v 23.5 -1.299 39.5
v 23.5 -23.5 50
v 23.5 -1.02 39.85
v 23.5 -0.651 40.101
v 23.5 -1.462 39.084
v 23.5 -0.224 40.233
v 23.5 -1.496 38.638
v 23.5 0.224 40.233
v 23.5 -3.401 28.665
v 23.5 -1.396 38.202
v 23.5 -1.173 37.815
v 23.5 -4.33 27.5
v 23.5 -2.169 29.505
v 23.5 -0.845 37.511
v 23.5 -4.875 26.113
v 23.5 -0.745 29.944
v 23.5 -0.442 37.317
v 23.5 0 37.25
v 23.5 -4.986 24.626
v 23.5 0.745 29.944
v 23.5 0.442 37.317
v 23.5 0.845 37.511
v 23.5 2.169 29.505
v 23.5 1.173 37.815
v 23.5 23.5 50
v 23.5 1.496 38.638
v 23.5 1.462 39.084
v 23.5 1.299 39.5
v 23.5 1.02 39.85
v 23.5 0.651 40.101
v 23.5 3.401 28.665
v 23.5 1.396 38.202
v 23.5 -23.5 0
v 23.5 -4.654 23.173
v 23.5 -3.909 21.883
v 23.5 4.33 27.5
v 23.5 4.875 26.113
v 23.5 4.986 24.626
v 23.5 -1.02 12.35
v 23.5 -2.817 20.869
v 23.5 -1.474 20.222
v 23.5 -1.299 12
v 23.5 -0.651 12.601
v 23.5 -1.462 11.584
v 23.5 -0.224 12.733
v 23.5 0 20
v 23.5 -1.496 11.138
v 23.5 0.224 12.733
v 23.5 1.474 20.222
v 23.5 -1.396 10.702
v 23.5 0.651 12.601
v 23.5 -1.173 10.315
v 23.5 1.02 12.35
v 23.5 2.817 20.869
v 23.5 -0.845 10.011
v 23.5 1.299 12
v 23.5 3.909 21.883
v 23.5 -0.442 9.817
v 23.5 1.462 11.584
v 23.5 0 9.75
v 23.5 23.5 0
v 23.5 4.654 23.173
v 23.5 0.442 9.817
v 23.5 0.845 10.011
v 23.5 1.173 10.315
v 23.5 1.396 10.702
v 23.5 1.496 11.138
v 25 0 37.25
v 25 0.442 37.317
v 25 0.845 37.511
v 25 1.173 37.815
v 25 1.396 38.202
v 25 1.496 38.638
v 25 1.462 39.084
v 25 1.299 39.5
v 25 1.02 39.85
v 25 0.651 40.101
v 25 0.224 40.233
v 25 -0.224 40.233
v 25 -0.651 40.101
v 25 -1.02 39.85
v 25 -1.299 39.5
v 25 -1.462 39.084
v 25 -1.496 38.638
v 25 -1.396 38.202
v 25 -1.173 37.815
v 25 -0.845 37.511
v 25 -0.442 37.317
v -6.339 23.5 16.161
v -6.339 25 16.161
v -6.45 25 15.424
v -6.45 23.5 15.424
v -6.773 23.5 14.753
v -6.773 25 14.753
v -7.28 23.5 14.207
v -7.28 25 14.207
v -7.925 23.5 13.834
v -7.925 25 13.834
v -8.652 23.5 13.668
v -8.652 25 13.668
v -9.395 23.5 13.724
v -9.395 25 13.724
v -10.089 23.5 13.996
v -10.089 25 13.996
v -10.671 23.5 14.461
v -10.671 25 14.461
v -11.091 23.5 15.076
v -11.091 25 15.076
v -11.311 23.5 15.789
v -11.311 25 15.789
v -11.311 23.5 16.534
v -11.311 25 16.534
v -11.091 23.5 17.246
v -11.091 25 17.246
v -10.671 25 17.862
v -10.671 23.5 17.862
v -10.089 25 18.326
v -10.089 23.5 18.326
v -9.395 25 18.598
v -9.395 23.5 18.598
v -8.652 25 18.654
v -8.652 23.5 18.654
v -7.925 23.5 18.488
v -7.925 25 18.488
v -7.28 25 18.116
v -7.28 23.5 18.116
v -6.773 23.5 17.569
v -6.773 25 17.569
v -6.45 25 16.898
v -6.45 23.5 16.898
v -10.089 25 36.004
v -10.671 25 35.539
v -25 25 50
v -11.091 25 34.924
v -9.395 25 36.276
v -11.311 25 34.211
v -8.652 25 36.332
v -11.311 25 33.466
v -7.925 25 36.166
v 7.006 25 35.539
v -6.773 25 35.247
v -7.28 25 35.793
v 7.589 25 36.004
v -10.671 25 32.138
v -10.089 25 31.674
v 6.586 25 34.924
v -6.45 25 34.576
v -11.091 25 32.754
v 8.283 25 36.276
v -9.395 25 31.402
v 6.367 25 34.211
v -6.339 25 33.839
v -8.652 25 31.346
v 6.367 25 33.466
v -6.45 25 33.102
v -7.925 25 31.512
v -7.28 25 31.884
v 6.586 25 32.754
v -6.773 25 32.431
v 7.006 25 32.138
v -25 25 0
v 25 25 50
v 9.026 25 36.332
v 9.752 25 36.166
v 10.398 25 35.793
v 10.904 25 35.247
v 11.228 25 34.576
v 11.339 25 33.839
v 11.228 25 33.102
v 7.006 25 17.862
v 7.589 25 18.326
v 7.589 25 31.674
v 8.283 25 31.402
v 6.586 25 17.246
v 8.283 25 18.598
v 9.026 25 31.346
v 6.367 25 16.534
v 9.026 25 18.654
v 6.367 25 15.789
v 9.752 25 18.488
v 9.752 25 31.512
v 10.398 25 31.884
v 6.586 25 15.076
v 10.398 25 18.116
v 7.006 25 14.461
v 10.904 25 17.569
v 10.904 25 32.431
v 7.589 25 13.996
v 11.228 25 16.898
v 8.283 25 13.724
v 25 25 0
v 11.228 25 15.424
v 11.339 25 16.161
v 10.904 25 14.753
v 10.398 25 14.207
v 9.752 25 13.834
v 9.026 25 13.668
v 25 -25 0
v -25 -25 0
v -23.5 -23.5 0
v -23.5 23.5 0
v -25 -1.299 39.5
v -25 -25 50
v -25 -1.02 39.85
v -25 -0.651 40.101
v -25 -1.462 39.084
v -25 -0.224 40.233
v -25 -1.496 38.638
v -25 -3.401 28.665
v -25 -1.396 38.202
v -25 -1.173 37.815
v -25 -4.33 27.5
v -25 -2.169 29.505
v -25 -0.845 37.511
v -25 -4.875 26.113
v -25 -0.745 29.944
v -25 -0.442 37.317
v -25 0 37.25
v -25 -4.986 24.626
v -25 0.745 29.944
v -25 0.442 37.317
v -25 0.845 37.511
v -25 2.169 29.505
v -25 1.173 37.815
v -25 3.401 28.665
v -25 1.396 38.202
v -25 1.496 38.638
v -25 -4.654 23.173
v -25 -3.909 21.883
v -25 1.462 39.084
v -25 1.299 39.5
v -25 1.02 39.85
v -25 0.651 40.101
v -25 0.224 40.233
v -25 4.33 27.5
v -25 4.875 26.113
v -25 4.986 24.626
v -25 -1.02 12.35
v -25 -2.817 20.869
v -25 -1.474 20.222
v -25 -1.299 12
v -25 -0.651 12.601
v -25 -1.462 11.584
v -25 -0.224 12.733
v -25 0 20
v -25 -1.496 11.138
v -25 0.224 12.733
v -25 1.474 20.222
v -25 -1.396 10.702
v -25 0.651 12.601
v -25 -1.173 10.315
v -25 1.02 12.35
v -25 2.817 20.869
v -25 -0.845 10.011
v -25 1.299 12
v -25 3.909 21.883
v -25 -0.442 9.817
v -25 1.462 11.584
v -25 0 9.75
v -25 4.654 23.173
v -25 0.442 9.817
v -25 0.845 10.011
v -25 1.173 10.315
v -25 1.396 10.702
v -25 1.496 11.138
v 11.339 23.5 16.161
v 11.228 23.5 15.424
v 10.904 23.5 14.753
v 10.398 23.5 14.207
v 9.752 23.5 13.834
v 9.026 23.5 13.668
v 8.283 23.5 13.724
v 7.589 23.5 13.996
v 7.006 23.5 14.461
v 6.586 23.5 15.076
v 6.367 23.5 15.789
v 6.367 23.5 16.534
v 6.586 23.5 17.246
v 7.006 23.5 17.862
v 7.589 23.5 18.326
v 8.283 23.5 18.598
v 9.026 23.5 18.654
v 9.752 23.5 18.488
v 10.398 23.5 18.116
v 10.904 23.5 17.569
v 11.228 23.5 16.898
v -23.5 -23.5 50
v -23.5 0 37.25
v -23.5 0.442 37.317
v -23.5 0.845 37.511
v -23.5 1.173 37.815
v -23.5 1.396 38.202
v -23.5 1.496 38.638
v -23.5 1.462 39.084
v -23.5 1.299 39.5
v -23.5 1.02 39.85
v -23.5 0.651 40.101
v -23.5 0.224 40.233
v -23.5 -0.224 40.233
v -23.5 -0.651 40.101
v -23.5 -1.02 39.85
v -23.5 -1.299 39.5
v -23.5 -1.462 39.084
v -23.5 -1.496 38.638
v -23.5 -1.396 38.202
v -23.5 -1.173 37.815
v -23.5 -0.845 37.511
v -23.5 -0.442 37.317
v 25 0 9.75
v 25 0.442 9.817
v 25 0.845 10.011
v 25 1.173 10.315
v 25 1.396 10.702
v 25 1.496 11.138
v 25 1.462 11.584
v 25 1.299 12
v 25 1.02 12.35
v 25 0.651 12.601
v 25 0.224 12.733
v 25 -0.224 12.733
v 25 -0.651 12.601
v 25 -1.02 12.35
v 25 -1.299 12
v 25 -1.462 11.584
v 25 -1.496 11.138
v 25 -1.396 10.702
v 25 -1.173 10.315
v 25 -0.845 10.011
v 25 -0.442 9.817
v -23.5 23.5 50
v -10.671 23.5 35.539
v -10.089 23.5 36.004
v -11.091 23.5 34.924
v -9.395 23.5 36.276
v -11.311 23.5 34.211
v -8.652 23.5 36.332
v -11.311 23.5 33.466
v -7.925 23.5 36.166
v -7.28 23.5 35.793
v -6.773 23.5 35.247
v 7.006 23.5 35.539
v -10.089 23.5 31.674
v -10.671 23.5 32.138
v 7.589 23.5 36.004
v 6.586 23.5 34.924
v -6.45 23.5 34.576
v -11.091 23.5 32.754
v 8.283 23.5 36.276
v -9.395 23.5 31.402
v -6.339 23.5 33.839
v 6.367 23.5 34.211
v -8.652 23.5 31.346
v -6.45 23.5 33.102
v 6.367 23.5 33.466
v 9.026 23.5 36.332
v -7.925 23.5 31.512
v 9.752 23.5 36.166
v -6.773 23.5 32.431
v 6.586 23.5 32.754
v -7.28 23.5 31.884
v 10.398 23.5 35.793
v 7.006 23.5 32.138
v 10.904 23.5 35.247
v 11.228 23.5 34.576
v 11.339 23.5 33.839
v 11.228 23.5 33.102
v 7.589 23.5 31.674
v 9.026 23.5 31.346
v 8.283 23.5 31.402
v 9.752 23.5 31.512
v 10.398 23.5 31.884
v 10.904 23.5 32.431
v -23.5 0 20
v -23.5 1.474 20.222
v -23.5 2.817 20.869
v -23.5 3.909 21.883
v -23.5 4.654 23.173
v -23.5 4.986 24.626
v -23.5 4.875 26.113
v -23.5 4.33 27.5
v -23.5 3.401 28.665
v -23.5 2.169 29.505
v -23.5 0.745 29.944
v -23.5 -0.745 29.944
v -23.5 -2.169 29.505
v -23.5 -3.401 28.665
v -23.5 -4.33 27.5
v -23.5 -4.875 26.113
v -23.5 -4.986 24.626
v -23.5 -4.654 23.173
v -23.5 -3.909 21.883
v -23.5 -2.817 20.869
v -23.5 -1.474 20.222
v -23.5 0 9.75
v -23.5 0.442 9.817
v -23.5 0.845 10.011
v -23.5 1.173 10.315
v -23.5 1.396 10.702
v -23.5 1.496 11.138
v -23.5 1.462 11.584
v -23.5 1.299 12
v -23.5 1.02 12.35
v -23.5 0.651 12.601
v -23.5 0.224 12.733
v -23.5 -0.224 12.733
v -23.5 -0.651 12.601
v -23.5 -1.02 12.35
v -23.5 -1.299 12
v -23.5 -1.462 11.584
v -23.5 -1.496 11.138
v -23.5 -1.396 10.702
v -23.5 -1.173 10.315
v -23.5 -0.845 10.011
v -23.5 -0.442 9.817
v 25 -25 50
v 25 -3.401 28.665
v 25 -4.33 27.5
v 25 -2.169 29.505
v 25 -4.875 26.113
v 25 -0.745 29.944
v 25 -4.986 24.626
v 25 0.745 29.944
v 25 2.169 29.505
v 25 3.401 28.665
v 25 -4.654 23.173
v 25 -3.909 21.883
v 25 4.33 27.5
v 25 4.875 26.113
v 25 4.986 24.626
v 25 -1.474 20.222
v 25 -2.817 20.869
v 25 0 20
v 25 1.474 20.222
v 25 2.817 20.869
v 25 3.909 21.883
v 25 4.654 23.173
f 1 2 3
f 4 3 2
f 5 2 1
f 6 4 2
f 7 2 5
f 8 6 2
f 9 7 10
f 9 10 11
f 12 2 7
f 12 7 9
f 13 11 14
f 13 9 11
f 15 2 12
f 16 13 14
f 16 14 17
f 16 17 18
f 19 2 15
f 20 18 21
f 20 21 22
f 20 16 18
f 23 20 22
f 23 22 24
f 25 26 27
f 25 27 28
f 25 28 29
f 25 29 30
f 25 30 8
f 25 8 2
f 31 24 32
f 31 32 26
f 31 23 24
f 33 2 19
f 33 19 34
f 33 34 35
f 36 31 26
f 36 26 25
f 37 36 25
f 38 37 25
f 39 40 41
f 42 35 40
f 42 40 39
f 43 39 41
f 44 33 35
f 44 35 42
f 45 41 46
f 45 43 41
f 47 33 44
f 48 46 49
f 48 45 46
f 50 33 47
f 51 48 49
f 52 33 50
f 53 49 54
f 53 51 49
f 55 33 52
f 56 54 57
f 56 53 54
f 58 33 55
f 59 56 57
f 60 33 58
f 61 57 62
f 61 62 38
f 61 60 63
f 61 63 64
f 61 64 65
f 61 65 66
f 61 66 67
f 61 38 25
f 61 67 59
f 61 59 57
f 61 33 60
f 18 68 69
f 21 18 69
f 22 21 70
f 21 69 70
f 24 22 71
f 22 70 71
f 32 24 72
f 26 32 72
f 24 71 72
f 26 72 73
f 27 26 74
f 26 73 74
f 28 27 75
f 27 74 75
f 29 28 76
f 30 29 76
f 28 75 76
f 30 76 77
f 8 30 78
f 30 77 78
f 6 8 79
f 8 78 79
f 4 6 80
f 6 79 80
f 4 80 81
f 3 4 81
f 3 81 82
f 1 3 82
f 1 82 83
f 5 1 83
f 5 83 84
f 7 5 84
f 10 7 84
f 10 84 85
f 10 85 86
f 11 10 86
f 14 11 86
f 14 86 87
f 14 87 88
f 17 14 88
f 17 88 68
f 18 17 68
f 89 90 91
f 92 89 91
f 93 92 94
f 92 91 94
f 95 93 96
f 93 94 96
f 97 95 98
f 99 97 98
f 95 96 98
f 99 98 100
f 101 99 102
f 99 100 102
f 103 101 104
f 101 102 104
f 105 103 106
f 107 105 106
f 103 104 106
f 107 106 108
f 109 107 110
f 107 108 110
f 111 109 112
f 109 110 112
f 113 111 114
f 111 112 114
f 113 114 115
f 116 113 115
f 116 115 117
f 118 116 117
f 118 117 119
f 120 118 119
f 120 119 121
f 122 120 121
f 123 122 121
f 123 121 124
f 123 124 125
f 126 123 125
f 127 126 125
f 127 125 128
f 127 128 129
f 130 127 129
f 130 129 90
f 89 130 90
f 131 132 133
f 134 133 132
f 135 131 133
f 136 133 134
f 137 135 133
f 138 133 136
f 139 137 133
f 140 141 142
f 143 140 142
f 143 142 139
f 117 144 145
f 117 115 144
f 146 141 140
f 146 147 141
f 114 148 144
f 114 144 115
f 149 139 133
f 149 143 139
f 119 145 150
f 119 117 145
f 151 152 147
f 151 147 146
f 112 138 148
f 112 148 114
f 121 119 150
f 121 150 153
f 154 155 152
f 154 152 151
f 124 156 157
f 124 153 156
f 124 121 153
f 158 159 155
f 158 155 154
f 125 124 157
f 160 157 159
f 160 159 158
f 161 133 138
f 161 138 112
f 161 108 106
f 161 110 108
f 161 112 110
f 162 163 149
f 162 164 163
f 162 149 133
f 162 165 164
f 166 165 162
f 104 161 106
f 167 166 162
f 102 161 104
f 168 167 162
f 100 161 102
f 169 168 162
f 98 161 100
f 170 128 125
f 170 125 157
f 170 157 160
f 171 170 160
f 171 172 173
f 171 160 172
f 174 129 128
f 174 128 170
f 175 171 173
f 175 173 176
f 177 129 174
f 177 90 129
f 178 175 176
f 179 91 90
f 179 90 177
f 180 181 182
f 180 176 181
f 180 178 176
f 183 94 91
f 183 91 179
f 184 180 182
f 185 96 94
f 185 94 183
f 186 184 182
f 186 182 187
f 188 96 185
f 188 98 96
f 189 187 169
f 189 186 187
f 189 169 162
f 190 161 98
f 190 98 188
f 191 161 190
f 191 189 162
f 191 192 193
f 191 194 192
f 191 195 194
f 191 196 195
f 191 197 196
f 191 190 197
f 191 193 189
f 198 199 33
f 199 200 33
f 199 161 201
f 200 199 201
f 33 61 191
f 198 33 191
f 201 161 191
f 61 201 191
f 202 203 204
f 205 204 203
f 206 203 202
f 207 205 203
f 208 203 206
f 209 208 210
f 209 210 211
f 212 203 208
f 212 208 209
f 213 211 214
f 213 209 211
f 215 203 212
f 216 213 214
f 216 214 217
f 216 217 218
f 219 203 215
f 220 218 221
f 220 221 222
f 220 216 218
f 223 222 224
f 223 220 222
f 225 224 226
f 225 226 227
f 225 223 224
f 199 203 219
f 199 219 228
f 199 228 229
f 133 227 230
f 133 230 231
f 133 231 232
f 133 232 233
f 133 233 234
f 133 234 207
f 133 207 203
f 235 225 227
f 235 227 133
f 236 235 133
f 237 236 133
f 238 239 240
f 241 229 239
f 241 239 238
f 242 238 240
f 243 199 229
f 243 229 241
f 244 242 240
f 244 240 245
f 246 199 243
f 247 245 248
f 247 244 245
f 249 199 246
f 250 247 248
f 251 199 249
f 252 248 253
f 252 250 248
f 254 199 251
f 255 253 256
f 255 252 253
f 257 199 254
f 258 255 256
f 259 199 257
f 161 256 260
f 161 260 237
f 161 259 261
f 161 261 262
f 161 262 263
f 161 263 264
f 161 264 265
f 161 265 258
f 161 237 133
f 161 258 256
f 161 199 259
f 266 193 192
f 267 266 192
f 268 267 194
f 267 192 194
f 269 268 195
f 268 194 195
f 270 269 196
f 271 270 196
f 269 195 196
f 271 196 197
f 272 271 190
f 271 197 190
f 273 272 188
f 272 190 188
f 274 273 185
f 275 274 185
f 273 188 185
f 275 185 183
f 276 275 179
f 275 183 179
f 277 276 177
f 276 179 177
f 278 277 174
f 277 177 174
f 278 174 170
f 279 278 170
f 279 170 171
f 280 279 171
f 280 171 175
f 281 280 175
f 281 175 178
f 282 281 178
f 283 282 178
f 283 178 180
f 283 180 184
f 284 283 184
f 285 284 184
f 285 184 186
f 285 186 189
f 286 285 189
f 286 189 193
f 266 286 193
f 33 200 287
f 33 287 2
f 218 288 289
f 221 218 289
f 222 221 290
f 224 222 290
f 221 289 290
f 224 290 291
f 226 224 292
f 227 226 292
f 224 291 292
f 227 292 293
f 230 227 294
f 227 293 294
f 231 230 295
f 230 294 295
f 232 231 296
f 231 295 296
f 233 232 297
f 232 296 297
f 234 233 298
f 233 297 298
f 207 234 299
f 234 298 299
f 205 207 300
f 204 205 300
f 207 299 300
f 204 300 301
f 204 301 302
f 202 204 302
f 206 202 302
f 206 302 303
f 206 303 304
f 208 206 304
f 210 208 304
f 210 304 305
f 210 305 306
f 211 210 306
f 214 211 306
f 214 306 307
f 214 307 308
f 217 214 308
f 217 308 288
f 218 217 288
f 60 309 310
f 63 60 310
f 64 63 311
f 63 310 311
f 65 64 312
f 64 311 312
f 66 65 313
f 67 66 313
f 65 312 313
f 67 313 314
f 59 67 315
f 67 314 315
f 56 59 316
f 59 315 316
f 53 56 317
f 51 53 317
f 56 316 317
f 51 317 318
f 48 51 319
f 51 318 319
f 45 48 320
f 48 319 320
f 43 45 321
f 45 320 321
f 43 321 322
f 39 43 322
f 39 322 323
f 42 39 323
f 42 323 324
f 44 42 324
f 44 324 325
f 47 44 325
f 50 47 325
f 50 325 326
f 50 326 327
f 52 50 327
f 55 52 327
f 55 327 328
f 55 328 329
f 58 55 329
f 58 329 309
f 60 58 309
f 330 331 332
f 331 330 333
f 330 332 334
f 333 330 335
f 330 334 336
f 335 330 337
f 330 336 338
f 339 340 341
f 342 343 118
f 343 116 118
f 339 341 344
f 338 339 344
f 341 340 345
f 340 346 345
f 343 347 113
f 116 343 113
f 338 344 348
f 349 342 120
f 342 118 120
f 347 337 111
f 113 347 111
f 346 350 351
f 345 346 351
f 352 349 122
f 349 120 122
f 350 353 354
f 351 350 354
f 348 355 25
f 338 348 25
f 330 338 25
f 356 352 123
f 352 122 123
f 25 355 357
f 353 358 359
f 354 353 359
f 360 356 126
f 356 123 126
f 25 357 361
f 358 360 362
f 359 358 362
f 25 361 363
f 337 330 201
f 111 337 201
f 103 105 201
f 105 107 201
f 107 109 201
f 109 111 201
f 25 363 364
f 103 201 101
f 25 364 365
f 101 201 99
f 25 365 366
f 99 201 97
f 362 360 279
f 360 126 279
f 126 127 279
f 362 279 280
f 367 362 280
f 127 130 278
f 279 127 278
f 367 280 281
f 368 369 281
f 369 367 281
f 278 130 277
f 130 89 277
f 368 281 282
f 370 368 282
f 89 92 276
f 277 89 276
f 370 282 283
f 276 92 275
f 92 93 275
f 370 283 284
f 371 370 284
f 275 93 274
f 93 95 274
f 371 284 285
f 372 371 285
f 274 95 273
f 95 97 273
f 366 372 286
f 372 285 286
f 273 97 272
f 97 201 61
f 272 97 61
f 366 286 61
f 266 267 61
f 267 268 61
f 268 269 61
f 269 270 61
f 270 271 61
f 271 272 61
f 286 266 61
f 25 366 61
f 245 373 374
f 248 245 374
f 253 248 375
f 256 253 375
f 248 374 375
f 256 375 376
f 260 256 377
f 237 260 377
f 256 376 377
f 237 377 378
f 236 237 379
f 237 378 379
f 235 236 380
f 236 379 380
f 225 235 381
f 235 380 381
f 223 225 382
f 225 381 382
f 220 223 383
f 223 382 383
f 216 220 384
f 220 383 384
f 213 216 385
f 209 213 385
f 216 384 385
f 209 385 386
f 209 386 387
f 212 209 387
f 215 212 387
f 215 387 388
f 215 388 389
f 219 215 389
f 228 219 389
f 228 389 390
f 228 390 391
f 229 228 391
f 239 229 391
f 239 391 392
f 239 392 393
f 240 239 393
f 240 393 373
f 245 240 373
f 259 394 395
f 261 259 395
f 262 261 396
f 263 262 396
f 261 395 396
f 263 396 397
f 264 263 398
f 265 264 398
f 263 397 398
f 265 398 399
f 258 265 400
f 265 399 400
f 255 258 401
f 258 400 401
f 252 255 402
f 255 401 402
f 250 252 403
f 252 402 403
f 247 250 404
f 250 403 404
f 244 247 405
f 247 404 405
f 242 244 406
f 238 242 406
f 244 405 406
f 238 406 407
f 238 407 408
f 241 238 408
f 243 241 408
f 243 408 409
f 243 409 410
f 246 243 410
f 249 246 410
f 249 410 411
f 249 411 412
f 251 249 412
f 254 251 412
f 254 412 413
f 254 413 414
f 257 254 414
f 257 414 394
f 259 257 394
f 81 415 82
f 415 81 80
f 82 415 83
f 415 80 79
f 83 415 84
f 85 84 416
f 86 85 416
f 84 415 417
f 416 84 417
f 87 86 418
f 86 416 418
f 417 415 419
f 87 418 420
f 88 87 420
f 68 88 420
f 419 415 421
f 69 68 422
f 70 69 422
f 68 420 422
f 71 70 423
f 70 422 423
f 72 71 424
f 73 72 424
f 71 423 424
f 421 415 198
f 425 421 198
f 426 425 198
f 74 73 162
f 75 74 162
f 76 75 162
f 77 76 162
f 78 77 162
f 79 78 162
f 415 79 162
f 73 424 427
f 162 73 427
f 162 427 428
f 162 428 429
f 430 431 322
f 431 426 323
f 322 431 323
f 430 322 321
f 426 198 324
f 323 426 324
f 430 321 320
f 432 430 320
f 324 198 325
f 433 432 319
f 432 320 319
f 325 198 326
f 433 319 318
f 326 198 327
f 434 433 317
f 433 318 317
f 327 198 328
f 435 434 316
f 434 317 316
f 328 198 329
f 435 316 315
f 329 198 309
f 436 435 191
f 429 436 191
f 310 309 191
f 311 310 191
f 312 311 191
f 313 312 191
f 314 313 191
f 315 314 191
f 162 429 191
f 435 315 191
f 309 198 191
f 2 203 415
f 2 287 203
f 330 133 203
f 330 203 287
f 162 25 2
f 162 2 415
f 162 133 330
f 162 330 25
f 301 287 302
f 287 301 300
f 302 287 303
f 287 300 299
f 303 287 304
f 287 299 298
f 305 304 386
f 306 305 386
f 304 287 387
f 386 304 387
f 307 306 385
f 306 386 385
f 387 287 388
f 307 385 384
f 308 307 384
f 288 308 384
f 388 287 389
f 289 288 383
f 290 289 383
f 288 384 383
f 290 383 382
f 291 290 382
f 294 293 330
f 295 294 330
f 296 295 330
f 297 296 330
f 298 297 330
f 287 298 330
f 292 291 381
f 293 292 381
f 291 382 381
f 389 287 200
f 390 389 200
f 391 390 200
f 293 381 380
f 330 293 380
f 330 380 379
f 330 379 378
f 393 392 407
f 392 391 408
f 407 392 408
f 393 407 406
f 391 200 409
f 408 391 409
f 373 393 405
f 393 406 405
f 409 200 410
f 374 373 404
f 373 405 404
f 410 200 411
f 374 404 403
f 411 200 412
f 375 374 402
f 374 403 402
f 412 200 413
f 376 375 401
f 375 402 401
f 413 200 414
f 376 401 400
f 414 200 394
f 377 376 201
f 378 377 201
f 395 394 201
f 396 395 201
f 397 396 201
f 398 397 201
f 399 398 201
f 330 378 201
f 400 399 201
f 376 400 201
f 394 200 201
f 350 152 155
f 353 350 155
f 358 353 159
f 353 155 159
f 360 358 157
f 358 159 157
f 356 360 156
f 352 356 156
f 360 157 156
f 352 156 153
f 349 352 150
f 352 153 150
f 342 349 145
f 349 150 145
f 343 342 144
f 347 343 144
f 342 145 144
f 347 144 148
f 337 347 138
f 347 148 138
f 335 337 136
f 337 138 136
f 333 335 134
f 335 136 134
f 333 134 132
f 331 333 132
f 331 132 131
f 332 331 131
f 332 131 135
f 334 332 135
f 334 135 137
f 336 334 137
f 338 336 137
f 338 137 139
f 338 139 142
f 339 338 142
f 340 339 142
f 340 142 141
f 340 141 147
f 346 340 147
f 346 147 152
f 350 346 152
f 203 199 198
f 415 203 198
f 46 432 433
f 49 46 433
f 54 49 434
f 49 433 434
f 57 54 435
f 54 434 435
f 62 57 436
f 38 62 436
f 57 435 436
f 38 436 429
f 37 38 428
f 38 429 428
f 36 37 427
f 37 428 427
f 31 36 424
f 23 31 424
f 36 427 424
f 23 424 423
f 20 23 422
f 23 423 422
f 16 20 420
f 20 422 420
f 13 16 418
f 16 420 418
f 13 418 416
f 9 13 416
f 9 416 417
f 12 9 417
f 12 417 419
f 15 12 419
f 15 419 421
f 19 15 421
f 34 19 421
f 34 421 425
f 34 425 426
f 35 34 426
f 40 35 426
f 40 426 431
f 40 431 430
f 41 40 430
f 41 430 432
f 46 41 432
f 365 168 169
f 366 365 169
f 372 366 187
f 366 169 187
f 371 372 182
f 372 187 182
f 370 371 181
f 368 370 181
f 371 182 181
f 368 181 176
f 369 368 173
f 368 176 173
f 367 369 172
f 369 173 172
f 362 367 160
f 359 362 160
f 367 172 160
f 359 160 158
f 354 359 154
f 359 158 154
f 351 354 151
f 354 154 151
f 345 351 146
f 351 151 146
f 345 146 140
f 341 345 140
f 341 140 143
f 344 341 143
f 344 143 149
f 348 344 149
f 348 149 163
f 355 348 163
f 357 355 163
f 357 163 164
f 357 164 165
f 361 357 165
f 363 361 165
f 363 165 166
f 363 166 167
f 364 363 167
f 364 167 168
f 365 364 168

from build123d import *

# Parameters (mm, degrees)
ESBO_O1_W                  = 50
ESBO_O1_H                  = 50
ESBO_O1_W_2                = 47
ESBO_O1_H_2                = 47
RESSALTO_EXTRUS_O1_DEPTH   = 50
ESBO_O3_R                  = 5
CORTE_EXTRUS_O1_DEPTH      = 1
CORTE_EXTRUS_O1_DEPTH_BACK = 51
ESBO_O2_R                  = 2.5
CORTE_EXTRUS_O2_DEPTH      = 10
ESBO_O5_R                  = 1.5
CORTE_EXTRUS_O3_DEPTH      = 1
CORTE_EXTRUS_O3_DEPTH_BACK = 51


with BuildPart() as part:
    # Esboço1 → Ressalto-extrusão1 (new body)
    with BuildSketch(Plane.XY):
        Rectangle(ESBO_O1_W, ESBO_O1_H)
        Rectangle(ESBO_O1_W_2, ESBO_O1_H_2, mode=Mode.SUBTRACT)
    extrude(amount=RESSALTO_EXTRUS_O1_DEPTH)

    # Esboço3 → Corte-extrusão1 (cut, two sides)
    with BuildSketch(Plane(origin=(25, 0, 0), x_dir=(0, 0, -1), z_dir=(1, 0, 0))) as corte_extrus_o1_sk:
        with Locations((-25, 0)):
            Circle(ESBO_O3_R)
    extrude(amount=CORTE_EXTRUS_O1_DEPTH, mode=Mode.SUBTRACT)
    extrude(corte_extrus_o1_sk.sketch, amount=-CORTE_EXTRUS_O1_DEPTH_BACK, mode=Mode.SUBTRACT)

    # Esboço2 → Corte-extrusão2 (cut)
    with BuildSketch(Plane(origin=(0, 25, 0), x_dir=(1, 0, 0), z_dir=(0, 1, 0))):
        with Locations((-8.838834765, -16.161165235)):
            Circle(ESBO_O2_R)
        with Locations((8.838834765, -16.161165235)):
            Circle(ESBO_O2_R)
        with Locations((-8.838834765, -33.838834765)):
            Circle(ESBO_O2_R)
        with Locations((8.838834765, -33.838834765)):
            Circle(ESBO_O2_R)
    extrude(amount=-CORTE_EXTRUS_O2_DEPTH, mode=Mode.SUBTRACT)

    # Esboço5 → Corte-extrusão3 (cut, two sides)
    with BuildSketch(Plane(origin=(25, 0, 0), x_dir=(0, 0, -1), z_dir=(1, 0, 0))) as corte_extrus_o3_sk:
        with Locations((-11.25, 0)):
            Circle(ESBO_O5_R)
        with Locations((-38.75, 0)):
            Circle(ESBO_O5_R)
    extrude(amount=CORTE_EXTRUS_O3_DEPTH, mode=Mode.SUBTRACT)
    extrude(corte_extrus_o3_sk.sketch, amount=-CORTE_EXTRUS_O3_DEPTH_BACK, mode=Mode.SUBTRACT)


solid = part.part
